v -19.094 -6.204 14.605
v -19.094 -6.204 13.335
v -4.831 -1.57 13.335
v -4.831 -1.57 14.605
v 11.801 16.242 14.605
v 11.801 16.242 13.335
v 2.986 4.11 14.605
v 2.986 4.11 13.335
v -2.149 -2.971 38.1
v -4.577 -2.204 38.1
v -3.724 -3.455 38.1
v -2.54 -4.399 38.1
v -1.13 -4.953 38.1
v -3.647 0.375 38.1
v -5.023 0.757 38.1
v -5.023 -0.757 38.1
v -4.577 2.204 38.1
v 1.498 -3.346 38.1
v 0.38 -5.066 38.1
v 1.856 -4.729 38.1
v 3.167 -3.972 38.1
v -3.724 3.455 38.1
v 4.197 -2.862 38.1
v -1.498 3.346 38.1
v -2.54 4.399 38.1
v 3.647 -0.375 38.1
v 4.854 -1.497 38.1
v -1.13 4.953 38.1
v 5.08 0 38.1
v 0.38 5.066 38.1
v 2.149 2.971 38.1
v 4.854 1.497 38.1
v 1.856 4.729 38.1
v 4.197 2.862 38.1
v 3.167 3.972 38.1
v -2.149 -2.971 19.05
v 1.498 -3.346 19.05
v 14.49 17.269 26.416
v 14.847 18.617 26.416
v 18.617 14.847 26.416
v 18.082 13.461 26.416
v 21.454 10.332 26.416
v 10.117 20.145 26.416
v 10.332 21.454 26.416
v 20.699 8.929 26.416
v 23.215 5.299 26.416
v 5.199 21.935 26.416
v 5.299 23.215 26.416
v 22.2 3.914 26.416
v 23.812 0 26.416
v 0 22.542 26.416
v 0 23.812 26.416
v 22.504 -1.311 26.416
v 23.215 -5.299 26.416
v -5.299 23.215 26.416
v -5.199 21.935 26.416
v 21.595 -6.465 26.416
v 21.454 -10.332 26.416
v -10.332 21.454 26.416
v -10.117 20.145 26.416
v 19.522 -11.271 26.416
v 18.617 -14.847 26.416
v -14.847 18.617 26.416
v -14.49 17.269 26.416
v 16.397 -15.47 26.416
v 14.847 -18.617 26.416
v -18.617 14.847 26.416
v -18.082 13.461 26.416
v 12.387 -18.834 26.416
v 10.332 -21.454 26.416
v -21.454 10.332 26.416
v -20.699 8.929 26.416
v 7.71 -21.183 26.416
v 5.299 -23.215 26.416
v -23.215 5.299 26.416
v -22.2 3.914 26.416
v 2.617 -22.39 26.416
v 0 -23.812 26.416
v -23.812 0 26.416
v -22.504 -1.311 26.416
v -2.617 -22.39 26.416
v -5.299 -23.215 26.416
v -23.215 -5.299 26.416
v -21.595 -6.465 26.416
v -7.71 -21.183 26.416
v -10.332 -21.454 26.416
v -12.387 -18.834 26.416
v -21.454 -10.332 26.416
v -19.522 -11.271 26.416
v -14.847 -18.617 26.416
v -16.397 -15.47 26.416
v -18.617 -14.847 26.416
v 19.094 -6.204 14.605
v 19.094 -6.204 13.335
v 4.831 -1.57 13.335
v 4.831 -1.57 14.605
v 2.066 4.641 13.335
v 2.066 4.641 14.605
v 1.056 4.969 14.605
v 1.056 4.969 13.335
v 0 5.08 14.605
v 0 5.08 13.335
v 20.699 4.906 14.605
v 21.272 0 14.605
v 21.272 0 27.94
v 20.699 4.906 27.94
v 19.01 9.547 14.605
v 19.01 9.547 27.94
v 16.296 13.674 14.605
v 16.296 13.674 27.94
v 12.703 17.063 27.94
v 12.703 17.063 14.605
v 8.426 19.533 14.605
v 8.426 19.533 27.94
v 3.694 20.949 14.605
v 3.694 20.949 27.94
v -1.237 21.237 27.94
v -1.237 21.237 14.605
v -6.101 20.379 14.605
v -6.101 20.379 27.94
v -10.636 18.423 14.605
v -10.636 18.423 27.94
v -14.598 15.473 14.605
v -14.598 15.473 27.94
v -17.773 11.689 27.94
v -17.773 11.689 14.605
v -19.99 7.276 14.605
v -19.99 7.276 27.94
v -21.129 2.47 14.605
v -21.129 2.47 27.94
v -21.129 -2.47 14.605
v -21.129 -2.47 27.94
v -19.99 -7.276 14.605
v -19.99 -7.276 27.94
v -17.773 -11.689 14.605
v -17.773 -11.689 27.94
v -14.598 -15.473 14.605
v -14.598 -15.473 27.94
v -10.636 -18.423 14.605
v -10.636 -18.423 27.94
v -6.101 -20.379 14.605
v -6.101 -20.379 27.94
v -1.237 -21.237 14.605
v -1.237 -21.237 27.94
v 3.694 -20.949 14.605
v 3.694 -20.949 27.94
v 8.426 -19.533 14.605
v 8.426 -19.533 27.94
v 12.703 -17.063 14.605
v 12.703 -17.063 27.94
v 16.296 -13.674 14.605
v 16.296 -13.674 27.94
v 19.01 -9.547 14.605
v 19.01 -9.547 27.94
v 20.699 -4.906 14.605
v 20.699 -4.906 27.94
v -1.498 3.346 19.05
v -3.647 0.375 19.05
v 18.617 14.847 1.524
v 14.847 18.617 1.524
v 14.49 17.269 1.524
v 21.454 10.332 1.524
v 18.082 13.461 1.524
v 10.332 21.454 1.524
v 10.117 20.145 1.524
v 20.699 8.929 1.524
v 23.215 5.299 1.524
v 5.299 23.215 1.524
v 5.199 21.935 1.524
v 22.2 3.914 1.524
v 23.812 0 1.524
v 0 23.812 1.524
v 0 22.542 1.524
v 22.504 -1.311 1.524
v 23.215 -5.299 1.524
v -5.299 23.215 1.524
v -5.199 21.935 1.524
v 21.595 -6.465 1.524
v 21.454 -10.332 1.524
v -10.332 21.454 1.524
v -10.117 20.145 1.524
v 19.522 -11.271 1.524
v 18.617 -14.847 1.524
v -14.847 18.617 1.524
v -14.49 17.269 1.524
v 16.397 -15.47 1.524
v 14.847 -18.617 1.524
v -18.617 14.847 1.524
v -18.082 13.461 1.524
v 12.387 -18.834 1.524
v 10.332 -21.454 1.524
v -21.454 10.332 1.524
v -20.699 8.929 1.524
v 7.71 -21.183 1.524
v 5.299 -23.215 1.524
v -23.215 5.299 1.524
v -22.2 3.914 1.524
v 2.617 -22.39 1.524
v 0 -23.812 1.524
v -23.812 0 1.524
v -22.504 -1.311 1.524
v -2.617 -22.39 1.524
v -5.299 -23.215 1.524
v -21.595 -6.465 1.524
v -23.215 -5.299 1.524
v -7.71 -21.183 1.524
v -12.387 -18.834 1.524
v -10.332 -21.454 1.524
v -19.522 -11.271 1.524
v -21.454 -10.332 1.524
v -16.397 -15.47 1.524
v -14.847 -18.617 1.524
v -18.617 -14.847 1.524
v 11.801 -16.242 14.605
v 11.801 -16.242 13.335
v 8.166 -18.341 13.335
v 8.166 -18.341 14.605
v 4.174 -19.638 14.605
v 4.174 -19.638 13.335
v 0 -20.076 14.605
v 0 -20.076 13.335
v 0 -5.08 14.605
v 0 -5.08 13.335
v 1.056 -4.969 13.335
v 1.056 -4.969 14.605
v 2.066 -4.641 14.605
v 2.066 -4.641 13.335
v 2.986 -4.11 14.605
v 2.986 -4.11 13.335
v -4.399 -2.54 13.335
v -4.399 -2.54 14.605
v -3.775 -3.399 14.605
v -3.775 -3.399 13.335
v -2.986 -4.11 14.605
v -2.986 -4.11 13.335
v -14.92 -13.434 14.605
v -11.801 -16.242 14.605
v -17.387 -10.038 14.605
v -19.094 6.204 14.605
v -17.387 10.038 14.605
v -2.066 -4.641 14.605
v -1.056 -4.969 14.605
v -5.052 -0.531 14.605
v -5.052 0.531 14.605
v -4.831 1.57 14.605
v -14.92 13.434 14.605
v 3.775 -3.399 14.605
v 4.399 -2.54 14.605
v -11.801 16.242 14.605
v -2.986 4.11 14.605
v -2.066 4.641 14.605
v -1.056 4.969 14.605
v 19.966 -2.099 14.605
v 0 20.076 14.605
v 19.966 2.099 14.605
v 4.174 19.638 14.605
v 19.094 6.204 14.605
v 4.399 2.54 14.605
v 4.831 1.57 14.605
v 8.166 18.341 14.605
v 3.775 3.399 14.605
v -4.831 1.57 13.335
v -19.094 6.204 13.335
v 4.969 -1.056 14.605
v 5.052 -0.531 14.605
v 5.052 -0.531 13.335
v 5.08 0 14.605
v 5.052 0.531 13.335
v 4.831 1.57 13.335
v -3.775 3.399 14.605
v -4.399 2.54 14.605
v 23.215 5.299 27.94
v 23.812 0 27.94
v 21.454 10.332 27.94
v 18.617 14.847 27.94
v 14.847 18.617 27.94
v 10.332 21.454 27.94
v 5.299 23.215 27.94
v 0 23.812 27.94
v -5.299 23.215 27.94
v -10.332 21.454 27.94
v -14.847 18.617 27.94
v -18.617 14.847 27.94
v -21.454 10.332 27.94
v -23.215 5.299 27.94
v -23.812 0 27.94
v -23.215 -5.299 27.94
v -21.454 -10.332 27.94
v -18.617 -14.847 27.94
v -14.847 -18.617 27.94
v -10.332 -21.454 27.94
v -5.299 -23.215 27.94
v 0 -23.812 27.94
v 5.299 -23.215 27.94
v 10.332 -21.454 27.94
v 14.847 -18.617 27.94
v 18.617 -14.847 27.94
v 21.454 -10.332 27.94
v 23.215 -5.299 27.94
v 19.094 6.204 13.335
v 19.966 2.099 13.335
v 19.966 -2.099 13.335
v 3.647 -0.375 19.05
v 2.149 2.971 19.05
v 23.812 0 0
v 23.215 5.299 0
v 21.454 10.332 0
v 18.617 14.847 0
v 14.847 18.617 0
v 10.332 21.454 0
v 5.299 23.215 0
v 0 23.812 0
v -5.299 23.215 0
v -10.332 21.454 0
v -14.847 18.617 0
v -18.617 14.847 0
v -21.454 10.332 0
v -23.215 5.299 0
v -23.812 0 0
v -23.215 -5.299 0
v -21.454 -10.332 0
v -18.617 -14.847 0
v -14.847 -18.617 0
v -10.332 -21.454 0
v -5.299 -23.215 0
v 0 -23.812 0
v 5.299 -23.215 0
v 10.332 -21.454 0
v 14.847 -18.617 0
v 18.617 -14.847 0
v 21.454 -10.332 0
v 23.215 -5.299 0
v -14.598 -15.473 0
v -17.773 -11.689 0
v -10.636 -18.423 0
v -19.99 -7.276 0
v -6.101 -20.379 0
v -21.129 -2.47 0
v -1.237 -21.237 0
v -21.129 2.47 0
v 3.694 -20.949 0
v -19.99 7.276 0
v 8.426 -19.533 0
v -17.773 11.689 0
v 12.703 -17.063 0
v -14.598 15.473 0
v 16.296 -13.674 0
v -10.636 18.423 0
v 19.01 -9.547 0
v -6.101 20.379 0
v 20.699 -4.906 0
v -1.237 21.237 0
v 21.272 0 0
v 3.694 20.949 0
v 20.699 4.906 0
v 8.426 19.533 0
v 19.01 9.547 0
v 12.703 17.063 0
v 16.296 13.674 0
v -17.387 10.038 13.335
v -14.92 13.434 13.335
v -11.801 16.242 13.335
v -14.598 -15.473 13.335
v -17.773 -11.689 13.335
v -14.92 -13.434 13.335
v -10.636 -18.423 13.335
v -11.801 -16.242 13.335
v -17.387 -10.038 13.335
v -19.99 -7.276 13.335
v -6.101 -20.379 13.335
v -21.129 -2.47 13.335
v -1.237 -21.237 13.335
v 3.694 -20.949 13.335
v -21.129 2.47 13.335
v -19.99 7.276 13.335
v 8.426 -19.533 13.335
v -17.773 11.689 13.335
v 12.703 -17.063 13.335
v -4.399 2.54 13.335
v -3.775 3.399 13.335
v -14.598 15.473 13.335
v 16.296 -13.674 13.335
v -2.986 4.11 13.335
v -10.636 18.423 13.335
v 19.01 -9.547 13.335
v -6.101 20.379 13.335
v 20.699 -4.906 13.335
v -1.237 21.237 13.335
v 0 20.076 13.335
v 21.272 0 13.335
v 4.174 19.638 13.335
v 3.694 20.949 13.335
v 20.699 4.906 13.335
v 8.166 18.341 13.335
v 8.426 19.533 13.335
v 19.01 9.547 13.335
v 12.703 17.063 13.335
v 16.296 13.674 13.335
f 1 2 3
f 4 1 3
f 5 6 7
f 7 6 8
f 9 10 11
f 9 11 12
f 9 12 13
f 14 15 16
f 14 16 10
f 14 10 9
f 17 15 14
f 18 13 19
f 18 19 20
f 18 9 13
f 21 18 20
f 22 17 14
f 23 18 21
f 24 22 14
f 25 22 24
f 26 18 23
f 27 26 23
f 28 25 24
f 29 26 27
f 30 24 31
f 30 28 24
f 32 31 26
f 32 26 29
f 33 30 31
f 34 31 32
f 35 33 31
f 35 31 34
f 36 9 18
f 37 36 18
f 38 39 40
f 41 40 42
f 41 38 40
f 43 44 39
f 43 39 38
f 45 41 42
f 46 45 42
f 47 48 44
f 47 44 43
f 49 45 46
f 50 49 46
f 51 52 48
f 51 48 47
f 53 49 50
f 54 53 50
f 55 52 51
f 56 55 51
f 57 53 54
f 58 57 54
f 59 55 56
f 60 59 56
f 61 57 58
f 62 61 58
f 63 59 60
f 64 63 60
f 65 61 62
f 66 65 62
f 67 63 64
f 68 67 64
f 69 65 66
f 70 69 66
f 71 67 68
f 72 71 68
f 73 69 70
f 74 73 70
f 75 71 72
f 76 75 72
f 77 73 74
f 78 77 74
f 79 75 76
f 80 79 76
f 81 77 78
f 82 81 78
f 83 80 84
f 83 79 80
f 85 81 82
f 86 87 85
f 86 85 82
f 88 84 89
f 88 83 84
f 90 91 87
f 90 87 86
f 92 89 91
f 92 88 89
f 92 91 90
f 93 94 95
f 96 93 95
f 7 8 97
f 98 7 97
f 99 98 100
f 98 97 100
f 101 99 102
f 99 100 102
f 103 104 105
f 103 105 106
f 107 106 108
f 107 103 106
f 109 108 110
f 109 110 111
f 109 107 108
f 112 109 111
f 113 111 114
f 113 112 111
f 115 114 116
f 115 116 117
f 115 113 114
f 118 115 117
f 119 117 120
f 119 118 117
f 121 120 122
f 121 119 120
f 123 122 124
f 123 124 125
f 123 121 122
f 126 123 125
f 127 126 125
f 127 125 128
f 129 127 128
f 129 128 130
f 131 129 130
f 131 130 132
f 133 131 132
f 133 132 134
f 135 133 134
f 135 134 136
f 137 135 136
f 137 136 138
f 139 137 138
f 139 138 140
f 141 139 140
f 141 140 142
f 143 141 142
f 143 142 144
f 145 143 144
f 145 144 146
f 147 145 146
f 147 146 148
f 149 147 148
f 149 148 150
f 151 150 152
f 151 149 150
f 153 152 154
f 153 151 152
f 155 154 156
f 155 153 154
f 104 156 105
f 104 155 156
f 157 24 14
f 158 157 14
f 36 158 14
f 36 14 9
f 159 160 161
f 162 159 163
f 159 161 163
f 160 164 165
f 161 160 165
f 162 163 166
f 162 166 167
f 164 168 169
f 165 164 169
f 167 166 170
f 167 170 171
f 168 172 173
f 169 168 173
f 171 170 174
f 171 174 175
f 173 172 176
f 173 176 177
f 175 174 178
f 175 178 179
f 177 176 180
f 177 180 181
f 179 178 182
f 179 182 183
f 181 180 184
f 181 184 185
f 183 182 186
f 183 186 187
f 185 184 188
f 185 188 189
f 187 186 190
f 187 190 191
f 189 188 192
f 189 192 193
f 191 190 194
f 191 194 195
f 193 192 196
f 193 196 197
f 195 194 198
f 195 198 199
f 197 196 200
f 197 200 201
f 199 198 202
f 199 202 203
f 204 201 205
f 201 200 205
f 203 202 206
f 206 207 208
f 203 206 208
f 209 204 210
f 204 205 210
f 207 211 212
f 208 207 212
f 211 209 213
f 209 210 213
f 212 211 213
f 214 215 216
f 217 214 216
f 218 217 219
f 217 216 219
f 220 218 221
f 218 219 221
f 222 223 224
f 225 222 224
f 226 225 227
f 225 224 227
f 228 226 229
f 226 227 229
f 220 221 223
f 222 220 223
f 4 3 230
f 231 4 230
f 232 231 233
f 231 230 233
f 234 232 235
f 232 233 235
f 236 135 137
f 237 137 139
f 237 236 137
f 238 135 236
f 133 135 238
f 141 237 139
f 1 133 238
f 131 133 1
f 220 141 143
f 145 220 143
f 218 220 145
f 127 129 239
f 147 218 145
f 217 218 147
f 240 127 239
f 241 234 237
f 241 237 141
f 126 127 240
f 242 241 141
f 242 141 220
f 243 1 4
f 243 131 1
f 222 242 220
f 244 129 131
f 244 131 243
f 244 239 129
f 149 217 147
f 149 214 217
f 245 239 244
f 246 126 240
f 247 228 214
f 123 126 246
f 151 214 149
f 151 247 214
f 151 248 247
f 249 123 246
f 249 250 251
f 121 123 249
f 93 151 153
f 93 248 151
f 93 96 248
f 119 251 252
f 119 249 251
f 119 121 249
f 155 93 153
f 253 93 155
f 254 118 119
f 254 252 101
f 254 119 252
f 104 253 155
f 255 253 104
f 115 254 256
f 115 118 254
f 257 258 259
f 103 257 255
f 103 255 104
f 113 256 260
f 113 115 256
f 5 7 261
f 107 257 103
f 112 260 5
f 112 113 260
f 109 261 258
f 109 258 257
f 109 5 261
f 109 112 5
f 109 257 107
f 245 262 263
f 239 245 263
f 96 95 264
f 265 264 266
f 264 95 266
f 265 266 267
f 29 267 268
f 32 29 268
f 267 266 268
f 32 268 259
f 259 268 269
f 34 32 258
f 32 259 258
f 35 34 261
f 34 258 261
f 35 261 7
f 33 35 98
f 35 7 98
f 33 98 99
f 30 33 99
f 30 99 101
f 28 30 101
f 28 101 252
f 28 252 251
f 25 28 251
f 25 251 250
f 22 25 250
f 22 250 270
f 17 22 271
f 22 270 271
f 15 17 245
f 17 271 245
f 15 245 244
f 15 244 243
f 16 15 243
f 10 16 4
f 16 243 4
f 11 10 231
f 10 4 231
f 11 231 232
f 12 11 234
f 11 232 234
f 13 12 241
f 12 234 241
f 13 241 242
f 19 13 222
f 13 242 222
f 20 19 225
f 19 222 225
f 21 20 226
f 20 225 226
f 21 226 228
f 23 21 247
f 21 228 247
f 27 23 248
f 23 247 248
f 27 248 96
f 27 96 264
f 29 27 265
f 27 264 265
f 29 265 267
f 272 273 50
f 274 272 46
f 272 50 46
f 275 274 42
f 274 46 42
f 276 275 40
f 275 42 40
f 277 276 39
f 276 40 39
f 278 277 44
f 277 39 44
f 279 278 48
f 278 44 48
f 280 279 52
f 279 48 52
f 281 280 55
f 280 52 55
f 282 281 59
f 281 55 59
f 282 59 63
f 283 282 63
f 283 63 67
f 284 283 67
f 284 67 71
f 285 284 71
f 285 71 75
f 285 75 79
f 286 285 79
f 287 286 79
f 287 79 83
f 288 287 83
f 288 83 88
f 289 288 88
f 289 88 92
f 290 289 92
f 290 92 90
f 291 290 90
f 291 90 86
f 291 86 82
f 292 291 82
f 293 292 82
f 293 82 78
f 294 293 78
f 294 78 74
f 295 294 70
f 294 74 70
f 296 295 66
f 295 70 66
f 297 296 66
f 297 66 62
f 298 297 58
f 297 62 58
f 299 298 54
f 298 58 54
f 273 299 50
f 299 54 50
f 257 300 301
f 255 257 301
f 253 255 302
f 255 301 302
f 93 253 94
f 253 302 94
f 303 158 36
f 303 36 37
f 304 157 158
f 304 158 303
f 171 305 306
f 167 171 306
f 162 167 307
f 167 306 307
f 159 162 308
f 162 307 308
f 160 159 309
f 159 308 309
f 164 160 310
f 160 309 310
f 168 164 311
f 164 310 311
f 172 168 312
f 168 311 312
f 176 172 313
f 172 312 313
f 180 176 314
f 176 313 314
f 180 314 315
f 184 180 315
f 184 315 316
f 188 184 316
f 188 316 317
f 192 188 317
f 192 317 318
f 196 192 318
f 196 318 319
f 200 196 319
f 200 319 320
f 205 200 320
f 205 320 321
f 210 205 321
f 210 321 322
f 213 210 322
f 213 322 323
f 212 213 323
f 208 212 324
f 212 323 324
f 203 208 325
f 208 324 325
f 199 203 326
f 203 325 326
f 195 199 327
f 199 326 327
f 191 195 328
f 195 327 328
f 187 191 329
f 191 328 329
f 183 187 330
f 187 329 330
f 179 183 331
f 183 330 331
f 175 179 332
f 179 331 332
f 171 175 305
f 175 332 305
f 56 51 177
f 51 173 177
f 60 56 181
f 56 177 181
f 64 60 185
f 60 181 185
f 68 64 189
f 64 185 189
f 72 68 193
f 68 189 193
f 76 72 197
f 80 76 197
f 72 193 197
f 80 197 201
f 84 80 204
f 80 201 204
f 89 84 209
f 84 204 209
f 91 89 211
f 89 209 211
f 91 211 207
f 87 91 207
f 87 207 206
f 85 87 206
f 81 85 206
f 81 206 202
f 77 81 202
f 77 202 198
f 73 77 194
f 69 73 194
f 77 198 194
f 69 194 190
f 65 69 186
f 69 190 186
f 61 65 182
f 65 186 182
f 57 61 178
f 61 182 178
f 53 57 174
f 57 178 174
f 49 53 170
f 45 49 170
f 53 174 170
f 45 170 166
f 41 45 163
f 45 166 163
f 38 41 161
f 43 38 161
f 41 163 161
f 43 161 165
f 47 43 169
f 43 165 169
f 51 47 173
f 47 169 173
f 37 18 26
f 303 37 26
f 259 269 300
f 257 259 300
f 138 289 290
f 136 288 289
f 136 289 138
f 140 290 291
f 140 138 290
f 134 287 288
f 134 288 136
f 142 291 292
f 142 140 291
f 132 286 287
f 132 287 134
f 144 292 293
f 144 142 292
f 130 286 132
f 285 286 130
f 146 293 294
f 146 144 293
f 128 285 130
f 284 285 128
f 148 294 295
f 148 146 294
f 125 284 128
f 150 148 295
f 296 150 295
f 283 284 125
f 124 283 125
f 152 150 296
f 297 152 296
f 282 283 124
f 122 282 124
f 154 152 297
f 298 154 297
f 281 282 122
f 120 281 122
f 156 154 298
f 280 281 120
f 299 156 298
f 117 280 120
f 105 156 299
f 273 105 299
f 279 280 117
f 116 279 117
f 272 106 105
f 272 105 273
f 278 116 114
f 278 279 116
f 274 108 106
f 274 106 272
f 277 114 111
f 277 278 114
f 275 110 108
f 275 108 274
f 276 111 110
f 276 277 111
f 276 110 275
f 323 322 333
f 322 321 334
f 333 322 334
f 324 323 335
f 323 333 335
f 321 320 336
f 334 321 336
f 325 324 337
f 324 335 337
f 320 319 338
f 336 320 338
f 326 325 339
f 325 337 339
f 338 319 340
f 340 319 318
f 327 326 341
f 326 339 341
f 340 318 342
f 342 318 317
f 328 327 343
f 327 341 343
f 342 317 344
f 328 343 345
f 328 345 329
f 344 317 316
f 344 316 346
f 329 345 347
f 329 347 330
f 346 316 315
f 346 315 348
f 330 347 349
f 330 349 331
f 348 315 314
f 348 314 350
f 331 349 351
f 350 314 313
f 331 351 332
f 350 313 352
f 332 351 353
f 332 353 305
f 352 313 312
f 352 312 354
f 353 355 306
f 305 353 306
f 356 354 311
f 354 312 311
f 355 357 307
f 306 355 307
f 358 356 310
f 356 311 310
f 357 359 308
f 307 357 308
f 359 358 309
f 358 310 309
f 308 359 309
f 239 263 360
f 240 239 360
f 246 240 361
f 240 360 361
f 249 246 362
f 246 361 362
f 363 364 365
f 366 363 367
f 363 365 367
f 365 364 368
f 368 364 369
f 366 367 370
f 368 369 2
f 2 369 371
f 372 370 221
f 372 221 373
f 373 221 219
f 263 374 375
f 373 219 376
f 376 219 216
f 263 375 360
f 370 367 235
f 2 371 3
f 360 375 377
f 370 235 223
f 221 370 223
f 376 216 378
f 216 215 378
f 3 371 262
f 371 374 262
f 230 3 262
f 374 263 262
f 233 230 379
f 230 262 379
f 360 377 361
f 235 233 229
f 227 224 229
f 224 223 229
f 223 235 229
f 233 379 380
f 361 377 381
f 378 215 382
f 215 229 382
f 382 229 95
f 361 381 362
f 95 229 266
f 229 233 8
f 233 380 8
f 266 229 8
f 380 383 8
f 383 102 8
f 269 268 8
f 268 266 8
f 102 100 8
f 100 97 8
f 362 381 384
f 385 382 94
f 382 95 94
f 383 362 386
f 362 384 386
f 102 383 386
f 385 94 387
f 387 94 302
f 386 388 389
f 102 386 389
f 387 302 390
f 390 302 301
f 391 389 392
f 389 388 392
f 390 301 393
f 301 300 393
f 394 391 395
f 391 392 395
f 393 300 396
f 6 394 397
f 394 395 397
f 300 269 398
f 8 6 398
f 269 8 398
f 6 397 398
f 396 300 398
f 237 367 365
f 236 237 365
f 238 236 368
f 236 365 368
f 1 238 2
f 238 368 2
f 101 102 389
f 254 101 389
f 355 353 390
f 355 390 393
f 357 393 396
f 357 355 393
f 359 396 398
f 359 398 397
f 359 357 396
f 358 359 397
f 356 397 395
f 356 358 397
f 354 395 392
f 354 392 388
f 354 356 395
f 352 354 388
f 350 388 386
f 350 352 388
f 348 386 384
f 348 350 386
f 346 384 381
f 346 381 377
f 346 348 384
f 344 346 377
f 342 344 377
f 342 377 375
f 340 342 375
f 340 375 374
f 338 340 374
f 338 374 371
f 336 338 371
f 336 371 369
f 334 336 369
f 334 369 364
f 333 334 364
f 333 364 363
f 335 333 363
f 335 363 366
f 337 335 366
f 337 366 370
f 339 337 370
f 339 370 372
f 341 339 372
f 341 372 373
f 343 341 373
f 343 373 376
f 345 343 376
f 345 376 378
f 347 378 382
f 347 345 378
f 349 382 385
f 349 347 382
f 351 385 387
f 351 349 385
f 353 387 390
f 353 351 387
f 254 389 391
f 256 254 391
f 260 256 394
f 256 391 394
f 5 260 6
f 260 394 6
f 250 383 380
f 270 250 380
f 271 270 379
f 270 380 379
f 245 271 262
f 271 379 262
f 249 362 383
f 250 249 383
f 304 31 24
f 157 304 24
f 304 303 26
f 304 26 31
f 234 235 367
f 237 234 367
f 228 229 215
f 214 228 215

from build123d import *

# Parameters (mm, degrees)
SKETCH1_R               = 23.8125
SKETCH1_R_2             = 21.2725
BOSS_EXTRUDE1_DEPTH     = 27.94
SKETCH2_W               = 24.892
SKETCH2_H               = 1.27
SKETCH5_R               = 21.2725
BOSS_EXTRUDE2_DEPTH     = 0.635
CUT_EXTRUDE2_DEPTH      = 37.706625253
CUT_EXTRUDE2_DEPTH_BACK = 37.706625253
SKETCH7_R               = 5.08
BOSS_EXTRUDE7_DEPTH     = 23.495
CUT_EXTRUDE3_DEPTH      = 19.05


with BuildPart() as part:
    # Sketch1 → Boss-Extrude1 (new body)
    with BuildSketch(Plane.XY):
        Circle(SKETCH1_R)
        Circle(SKETCH1_R_2, mode=Mode.SUBTRACT)
    extrude(amount=BOSS_EXTRUDE1_DEPTH)

    # Sketch2 → Cut-Revolve2 (revolve, cut)
    with BuildSketch(Plane(origin=(0, 0, 0), x_dir=(0, 0, -1), z_dir=(1, 0, 0))):
        with Locations((-13.97, 23.1775)):
            Rectangle(SKETCH2_W, SKETCH2_H)
    revolve(axis=Axis((0, 0, 0), (0, 0, 1)), mode=Mode.SUBTRACT)

    # Sketch5 → Boss-Extrude2 (add, symmetric)
    with BuildSketch(Plane.XY.offset(13.97)):
        Circle(SKETCH5_R)
    extrude(amount=BOSS_EXTRUDE2_DEPTH, both=True)

    # Sketch6 → Cut-Extrude2 (cut, two sides: drawn at the far end of the back side and taken through both)
    with BuildSketch(Plane.XY.offset(14.605).offset(-CUT_EXTRUDE2_DEPTH_BACK)):
        with BuildLine():
            Line((0, 5.08), (0, 20.076289255))
            ThreePointArc((0, 20.076289255), (6.203914564, 19.093685719), (11.800546745, 16.242059191))
            Line((11.800546745, 16.242059191), (2.985949082, 4.109806331))
            ThreePointArc((2.985949082, 4.109806331), (1.569806331, 4.831367103), (0, 5.08))
        make_face()
        with BuildLine():
            Line((4.831367103, 1.569806331), (19.093685719, 6.203914564))
            ThreePointArc((19.093685719, 6.203914564), (20.076289255, 0), (19.093685719, -6.203914564))
            Line((19.093685719, -6.203914564), (4.831367103, -1.569806331))
            ThreePointArc((4.831367103, -1.569806331), (5.08, 0), (4.831367103, 1.569806331))
        make_face()
        with BuildLine():
            Line((2.985949082, -4.109806331), (11.800546745, -16.242059191))
            ThreePointArc((11.800546745, -16.242059191), (6.203914564, -19.093685719), (0, -20.076289255))
            Line((0, -20.076289255), (0, -5.08))
            ThreePointArc((0, -5.08), (1.569806331, -4.831367103), (2.985949082, -4.109806331))
        make_face()
        with BuildLine():
            Line((-2.985949082, -4.109806331), (-11.800546745, -16.242059191))
            ThreePointArc((-11.800546745, -16.242059191), (-16.242059191, -11.800546745), (-19.093685719, -6.203914564))
            Line((-19.093685719, -6.203914564), (-4.831367103, -1.569806331))
            ThreePointArc((-4.831367103, -1.569806331), (-4.109806331, -2.985949082), (-2.985949082, -4.109806331))
        make_face()
        with BuildLine():
            Line((-4.831367103, 1.569806331), (-19.093685719, 6.203914564))
            ThreePointArc((-19.093685719, 6.203914564), (-16.242059191, 11.800546745), (-11.800546745, 16.242059191))
            Line((-11.800546745, 16.242059191), (-2.985949082, 4.109806331))
            ThreePointArc((-2.985949082, 4.109806331), (-4.109806331, 2.985949082), (-4.831367103, 1.569806331))
        make_face()
    extrude(amount=CUT_EXTRUDE2_DEPTH + CUT_EXTRUDE2_DEPTH_BACK, mode=Mode.SUBTRACT)

    # Sketch7 → Boss-Extrude7 (add)
    with BuildSketch(Plane.XY.offset(14.605)):
        Circle(SKETCH7_R)
    extrude(amount=BOSS_EXTRUDE7_DEPTH)

    # Sketch8 → Cut-Extrude3 (cut)
    with BuildSketch(Plane.XY.offset(38.1)):
        Polygon((-1.498265311, 3.346047578), (-3.64689486, 0.375487968), (-2.148629549, -2.97055961), (1.498265311, -3.346047578), (3.64689486, -0.375487968), (2.148629549, 2.97055961), align=None)
    extrude(amount=-CUT_EXTRUDE3_DEPTH, mode=Mode.SUBTRACT)


solid = part.part
